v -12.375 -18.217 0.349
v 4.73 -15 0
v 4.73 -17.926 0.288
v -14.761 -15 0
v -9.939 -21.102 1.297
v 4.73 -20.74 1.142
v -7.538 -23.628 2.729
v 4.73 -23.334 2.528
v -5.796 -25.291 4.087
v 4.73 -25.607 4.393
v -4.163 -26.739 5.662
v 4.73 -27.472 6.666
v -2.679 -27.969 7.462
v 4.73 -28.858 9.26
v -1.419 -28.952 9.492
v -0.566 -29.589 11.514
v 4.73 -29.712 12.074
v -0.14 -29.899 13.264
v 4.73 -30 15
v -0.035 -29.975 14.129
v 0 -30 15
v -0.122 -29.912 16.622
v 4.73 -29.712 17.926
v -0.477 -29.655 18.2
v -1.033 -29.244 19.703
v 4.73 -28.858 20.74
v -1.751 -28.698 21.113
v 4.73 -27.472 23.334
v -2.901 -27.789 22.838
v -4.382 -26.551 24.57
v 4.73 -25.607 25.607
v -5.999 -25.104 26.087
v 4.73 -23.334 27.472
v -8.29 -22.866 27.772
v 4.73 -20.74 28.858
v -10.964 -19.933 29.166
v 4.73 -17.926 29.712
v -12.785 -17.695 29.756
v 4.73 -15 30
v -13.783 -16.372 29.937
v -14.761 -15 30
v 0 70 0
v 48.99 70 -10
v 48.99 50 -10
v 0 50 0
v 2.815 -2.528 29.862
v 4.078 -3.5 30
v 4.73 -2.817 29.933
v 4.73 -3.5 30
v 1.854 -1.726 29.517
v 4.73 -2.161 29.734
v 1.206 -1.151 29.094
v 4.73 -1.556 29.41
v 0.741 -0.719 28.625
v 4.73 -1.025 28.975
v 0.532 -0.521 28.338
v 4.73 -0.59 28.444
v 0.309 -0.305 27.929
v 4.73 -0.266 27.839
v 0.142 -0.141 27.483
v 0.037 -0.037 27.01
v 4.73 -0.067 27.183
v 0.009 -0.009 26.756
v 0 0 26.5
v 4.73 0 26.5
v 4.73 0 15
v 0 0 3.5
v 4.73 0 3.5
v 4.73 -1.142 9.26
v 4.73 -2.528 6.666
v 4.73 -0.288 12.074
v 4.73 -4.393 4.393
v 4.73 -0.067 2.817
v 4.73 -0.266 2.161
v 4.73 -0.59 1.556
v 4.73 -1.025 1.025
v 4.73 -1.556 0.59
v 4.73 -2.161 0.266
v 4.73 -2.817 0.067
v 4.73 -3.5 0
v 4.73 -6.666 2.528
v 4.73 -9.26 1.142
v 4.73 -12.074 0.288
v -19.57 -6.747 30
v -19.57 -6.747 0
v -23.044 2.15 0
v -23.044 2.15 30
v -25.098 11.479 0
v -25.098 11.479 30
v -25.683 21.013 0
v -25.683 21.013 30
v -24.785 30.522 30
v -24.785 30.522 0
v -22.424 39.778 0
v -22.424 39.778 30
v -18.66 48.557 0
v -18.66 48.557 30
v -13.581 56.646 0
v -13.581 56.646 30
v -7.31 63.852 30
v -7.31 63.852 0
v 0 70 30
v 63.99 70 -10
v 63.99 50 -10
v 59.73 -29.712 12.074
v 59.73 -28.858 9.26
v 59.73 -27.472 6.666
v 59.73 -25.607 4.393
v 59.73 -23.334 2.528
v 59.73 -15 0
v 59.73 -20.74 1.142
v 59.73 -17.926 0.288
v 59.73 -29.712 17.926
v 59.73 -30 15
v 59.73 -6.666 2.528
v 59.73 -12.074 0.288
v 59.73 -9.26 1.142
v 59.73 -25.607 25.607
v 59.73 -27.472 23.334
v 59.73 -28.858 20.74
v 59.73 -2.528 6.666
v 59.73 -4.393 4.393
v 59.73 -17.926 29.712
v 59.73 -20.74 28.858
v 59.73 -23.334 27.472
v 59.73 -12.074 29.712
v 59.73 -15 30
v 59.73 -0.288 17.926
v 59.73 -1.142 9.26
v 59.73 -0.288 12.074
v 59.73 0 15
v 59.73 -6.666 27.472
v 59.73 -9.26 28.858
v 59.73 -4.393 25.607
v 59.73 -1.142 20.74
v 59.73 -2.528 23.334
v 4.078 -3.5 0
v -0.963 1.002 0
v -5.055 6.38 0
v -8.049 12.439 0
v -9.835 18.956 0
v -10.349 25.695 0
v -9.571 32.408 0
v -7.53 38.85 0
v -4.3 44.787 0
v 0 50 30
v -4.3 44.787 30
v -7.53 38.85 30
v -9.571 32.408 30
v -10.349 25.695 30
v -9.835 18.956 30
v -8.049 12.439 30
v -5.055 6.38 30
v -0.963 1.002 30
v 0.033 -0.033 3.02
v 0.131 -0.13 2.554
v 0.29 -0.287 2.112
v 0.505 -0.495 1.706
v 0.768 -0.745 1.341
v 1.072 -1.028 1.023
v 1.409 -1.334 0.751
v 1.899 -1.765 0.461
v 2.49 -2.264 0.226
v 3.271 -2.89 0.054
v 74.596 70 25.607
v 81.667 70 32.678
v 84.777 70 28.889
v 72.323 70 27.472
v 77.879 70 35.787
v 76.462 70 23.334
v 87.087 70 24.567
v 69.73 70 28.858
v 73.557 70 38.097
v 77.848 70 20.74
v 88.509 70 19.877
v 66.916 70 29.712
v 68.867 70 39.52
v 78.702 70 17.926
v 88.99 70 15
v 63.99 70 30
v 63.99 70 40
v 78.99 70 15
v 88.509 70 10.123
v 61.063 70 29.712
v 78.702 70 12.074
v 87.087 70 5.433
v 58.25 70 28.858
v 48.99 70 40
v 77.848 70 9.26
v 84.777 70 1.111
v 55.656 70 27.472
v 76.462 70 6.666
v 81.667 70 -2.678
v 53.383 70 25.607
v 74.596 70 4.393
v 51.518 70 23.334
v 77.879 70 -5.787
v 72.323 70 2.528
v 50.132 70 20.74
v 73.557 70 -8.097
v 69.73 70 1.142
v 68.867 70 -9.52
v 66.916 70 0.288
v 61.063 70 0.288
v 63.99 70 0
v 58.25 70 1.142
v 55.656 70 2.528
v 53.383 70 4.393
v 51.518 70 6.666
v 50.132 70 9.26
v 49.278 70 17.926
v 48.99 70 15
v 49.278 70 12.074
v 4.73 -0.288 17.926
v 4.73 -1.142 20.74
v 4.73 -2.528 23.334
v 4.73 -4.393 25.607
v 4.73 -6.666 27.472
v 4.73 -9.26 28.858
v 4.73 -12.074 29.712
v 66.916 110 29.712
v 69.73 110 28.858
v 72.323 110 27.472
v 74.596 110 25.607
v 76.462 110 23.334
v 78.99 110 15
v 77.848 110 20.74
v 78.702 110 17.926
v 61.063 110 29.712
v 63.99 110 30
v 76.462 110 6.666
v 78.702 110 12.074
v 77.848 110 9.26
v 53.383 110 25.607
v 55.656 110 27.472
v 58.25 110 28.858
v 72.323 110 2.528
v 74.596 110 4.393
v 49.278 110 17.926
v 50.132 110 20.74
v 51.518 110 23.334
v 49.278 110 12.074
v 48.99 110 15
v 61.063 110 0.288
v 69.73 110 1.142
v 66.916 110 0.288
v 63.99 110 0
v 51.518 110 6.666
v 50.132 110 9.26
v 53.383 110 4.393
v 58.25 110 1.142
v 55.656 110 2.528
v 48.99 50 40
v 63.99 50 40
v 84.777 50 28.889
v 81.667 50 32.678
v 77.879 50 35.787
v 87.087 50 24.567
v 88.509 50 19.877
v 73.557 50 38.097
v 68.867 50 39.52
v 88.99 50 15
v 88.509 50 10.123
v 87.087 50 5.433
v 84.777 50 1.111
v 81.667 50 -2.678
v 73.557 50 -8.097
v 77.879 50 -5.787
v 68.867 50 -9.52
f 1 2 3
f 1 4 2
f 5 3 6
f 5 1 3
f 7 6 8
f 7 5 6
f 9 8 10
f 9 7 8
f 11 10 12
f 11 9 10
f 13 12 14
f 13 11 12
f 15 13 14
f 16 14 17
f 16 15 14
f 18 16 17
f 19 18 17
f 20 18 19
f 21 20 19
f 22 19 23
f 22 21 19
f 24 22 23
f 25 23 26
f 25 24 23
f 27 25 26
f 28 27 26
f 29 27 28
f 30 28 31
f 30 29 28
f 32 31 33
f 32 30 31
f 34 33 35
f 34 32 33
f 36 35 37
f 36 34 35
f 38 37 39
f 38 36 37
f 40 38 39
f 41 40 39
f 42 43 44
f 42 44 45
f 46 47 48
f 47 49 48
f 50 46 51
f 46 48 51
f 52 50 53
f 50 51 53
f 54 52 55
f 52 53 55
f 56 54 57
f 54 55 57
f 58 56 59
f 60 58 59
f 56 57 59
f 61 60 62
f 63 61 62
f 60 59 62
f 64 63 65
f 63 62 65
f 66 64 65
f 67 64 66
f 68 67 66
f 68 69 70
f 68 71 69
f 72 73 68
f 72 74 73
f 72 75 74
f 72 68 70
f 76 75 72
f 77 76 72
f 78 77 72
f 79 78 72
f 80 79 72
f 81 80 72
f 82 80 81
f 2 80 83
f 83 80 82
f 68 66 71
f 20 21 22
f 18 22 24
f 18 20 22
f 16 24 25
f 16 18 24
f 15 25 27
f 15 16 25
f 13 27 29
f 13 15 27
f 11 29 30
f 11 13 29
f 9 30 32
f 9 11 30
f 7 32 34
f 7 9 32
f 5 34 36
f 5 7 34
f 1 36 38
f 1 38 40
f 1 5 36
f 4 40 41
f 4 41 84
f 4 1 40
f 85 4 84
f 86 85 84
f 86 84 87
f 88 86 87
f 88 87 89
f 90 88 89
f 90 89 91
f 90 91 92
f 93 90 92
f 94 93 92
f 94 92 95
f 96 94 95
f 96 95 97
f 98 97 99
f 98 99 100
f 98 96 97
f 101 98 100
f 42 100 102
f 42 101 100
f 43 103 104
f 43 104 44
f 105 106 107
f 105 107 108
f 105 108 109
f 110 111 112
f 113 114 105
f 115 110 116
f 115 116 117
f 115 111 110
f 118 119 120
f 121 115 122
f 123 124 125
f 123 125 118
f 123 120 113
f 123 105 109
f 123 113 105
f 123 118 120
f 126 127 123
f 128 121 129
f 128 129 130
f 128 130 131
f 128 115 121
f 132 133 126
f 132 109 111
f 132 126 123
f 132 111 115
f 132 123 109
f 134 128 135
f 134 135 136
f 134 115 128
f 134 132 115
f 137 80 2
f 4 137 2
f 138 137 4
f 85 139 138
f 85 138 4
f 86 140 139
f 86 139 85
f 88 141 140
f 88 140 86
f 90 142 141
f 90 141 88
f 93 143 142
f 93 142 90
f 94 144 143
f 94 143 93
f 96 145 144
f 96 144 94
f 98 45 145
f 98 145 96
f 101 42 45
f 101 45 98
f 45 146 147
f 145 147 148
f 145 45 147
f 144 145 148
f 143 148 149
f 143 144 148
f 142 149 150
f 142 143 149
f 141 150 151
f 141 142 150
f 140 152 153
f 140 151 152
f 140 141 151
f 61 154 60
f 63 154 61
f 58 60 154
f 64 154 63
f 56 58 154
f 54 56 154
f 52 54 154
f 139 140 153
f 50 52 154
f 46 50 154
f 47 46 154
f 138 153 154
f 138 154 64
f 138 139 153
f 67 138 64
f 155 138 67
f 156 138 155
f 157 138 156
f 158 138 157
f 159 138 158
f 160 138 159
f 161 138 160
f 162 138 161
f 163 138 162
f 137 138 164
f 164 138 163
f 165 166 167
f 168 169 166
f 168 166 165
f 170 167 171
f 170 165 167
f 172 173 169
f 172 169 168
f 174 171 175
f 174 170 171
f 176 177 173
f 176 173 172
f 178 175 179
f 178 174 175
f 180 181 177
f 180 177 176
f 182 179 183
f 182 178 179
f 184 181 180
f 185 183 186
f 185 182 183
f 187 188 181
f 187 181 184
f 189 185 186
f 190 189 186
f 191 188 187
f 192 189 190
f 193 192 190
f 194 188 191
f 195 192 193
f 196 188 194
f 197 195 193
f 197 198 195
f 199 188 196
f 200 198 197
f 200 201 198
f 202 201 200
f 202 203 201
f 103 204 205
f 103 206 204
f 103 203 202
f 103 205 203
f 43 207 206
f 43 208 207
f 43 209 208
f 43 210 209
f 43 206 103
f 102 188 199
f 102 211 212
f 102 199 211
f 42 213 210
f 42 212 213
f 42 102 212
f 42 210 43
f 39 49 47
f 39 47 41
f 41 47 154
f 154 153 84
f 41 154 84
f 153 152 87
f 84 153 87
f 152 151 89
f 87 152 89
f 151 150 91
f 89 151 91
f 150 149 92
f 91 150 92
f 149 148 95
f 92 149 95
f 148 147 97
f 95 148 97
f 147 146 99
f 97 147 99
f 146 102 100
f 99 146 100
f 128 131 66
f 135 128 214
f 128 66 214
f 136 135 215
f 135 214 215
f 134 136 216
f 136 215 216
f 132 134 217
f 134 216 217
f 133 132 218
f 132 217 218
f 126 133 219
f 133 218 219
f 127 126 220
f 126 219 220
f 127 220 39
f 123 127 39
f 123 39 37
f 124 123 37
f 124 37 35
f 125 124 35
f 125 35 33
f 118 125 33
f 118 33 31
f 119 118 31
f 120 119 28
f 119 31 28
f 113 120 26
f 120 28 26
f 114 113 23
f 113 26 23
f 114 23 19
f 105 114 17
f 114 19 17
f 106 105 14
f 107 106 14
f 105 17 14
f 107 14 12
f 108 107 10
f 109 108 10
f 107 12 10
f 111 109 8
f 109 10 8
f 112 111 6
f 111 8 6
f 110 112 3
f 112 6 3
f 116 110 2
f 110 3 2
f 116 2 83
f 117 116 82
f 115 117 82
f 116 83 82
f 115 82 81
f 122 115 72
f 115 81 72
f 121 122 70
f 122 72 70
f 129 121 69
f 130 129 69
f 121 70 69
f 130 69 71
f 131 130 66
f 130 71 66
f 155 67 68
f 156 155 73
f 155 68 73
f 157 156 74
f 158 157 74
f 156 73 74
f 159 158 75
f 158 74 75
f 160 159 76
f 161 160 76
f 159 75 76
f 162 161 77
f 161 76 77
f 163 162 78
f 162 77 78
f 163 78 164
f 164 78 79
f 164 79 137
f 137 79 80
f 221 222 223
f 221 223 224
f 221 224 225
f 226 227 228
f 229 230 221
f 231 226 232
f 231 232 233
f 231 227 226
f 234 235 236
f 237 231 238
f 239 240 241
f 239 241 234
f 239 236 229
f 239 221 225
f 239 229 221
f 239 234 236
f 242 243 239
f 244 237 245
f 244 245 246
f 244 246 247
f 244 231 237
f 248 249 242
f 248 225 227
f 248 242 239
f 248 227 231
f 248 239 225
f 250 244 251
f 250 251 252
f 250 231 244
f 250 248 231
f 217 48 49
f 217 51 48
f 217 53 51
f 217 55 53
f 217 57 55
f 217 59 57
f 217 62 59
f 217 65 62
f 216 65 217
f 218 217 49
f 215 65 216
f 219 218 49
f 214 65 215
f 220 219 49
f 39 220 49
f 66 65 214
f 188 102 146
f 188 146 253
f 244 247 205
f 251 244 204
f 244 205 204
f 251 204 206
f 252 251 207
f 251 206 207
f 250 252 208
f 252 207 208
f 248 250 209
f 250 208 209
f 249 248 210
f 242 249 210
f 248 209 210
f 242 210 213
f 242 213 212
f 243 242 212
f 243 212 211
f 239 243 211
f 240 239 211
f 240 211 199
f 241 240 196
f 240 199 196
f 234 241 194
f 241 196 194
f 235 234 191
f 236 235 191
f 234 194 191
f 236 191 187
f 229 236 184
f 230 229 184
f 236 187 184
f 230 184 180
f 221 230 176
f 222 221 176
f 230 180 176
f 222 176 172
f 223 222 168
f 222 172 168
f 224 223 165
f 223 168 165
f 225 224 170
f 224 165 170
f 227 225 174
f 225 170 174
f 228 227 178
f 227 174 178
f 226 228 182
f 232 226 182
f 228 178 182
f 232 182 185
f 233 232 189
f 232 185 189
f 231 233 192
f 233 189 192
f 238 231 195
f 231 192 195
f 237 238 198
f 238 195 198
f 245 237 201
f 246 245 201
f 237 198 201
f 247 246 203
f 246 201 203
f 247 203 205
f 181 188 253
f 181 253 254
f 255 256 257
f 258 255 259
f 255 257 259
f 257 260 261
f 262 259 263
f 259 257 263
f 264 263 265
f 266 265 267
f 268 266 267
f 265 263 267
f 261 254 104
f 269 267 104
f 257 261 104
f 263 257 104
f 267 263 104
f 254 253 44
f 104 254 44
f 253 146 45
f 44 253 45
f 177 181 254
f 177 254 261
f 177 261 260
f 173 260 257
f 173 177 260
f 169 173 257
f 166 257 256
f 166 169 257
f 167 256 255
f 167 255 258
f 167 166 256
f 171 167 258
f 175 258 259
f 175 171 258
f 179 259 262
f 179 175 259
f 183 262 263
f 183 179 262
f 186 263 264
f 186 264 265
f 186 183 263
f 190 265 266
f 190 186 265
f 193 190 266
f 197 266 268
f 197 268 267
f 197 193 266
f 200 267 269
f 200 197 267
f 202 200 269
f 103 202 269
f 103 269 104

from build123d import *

# Parameters (mm, degrees)
BOSS_EXTRUDE1_DEPTH = 30
SKETCH2_R           = 15
BOSS_EXTRUDE2_DEPTH = 55
FILLET1_R           = 3.5
FILLET5_R           = 15
BOSS_EXTRUDE3_DEPTH = 20
SKETCH6_R           = 15
BOSS_EXTRUDE4_DEPTH = 40


with BuildPart() as part:
    # Sketch1 → Boss-Extrude1 (new body)
    with BuildSketch(Plane.XY):
        with BuildLine():
            Line((0, 0), (4.730174559, 0))
            Line((4.730174559, 0), (4.730174559, -30))
            Line((4.730174559, -30), (0, -30))
            ThreePointArc((0, -30), (-25.69148146, 20), (0, 70))
            Line((0, 70), (0, 50))
            ThreePointArc((0, 50), (-10.355339059, 25), (0, 0))
        make_face()
    extrude(amount=BOSS_EXTRUDE1_DEPTH)

    # Sketch2 → Boss-Extrude2 (add)
    with BuildSketch(Plane(origin=(4.730174559, 0, 0), x_dir=(0, 0, -1), z_dir=(1, 0, 0))):
        with Locations(Location((-15, -15, 0), (0, 0, 90))):
            Circle(SKETCH2_R)
    extrude(amount=BOSS_EXTRUDE2_DEPTH)

    # Fillet1
    fillet1_edges = [part.edges().sort_by_distance(p)[0] for p in [
        (2.36508728, 0, 30),
        (2.36508728, 0, 0),
    ]]
    fillet(fillet1_edges, radius=FILLET1_R)

    # Fillet5
    fillet5_edges = [part.edges().sort_by_distance(p)[0] for p in [
        (2.36508728, -30, 0),
        (2.36508728, -30, 30),
    ]]
    fillet(fillet5_edges, radius=FILLET5_R - 0.0001)  # a hair under: the kernel refuses the full size

    # Sketch5 → Boss-Extrude3 (add)
    with BuildSketch(Plane(origin=(0, 70, 0), x_dir=(0, 0, -1), z_dir=(0, 1, 0))):
        with BuildLine():
            Line((-30, 0), (-40, -48.989794856))
            Line((-40, -48.989794856), (-40, -63.989794856))
            ThreePointArc((-40, -63.989794856), (-15, -88.989794856), (10, -63.989794856))
            Line((10, -63.989794856), (10, -48.989794856))
            Line((10, -48.989794856), (0, 0))
            Line((0, 0), (-30, 0))
        make_face()
    extrude(amount=-BOSS_EXTRUDE3_DEPTH)

    # Sketch6 → Boss-Extrude4 (add)
    with BuildSketch(Plane(origin=(0, 70, 0), x_dir=(1, 0, 0), z_dir=(0, 1, 0))):
        with Locations(Location((63.989794856, -15, 0), (0, 0, 90))):
            Circle(SKETCH6_R)
    extrude(amount=BOSS_EXTRUDE4_DEPTH)


solid = part.part
